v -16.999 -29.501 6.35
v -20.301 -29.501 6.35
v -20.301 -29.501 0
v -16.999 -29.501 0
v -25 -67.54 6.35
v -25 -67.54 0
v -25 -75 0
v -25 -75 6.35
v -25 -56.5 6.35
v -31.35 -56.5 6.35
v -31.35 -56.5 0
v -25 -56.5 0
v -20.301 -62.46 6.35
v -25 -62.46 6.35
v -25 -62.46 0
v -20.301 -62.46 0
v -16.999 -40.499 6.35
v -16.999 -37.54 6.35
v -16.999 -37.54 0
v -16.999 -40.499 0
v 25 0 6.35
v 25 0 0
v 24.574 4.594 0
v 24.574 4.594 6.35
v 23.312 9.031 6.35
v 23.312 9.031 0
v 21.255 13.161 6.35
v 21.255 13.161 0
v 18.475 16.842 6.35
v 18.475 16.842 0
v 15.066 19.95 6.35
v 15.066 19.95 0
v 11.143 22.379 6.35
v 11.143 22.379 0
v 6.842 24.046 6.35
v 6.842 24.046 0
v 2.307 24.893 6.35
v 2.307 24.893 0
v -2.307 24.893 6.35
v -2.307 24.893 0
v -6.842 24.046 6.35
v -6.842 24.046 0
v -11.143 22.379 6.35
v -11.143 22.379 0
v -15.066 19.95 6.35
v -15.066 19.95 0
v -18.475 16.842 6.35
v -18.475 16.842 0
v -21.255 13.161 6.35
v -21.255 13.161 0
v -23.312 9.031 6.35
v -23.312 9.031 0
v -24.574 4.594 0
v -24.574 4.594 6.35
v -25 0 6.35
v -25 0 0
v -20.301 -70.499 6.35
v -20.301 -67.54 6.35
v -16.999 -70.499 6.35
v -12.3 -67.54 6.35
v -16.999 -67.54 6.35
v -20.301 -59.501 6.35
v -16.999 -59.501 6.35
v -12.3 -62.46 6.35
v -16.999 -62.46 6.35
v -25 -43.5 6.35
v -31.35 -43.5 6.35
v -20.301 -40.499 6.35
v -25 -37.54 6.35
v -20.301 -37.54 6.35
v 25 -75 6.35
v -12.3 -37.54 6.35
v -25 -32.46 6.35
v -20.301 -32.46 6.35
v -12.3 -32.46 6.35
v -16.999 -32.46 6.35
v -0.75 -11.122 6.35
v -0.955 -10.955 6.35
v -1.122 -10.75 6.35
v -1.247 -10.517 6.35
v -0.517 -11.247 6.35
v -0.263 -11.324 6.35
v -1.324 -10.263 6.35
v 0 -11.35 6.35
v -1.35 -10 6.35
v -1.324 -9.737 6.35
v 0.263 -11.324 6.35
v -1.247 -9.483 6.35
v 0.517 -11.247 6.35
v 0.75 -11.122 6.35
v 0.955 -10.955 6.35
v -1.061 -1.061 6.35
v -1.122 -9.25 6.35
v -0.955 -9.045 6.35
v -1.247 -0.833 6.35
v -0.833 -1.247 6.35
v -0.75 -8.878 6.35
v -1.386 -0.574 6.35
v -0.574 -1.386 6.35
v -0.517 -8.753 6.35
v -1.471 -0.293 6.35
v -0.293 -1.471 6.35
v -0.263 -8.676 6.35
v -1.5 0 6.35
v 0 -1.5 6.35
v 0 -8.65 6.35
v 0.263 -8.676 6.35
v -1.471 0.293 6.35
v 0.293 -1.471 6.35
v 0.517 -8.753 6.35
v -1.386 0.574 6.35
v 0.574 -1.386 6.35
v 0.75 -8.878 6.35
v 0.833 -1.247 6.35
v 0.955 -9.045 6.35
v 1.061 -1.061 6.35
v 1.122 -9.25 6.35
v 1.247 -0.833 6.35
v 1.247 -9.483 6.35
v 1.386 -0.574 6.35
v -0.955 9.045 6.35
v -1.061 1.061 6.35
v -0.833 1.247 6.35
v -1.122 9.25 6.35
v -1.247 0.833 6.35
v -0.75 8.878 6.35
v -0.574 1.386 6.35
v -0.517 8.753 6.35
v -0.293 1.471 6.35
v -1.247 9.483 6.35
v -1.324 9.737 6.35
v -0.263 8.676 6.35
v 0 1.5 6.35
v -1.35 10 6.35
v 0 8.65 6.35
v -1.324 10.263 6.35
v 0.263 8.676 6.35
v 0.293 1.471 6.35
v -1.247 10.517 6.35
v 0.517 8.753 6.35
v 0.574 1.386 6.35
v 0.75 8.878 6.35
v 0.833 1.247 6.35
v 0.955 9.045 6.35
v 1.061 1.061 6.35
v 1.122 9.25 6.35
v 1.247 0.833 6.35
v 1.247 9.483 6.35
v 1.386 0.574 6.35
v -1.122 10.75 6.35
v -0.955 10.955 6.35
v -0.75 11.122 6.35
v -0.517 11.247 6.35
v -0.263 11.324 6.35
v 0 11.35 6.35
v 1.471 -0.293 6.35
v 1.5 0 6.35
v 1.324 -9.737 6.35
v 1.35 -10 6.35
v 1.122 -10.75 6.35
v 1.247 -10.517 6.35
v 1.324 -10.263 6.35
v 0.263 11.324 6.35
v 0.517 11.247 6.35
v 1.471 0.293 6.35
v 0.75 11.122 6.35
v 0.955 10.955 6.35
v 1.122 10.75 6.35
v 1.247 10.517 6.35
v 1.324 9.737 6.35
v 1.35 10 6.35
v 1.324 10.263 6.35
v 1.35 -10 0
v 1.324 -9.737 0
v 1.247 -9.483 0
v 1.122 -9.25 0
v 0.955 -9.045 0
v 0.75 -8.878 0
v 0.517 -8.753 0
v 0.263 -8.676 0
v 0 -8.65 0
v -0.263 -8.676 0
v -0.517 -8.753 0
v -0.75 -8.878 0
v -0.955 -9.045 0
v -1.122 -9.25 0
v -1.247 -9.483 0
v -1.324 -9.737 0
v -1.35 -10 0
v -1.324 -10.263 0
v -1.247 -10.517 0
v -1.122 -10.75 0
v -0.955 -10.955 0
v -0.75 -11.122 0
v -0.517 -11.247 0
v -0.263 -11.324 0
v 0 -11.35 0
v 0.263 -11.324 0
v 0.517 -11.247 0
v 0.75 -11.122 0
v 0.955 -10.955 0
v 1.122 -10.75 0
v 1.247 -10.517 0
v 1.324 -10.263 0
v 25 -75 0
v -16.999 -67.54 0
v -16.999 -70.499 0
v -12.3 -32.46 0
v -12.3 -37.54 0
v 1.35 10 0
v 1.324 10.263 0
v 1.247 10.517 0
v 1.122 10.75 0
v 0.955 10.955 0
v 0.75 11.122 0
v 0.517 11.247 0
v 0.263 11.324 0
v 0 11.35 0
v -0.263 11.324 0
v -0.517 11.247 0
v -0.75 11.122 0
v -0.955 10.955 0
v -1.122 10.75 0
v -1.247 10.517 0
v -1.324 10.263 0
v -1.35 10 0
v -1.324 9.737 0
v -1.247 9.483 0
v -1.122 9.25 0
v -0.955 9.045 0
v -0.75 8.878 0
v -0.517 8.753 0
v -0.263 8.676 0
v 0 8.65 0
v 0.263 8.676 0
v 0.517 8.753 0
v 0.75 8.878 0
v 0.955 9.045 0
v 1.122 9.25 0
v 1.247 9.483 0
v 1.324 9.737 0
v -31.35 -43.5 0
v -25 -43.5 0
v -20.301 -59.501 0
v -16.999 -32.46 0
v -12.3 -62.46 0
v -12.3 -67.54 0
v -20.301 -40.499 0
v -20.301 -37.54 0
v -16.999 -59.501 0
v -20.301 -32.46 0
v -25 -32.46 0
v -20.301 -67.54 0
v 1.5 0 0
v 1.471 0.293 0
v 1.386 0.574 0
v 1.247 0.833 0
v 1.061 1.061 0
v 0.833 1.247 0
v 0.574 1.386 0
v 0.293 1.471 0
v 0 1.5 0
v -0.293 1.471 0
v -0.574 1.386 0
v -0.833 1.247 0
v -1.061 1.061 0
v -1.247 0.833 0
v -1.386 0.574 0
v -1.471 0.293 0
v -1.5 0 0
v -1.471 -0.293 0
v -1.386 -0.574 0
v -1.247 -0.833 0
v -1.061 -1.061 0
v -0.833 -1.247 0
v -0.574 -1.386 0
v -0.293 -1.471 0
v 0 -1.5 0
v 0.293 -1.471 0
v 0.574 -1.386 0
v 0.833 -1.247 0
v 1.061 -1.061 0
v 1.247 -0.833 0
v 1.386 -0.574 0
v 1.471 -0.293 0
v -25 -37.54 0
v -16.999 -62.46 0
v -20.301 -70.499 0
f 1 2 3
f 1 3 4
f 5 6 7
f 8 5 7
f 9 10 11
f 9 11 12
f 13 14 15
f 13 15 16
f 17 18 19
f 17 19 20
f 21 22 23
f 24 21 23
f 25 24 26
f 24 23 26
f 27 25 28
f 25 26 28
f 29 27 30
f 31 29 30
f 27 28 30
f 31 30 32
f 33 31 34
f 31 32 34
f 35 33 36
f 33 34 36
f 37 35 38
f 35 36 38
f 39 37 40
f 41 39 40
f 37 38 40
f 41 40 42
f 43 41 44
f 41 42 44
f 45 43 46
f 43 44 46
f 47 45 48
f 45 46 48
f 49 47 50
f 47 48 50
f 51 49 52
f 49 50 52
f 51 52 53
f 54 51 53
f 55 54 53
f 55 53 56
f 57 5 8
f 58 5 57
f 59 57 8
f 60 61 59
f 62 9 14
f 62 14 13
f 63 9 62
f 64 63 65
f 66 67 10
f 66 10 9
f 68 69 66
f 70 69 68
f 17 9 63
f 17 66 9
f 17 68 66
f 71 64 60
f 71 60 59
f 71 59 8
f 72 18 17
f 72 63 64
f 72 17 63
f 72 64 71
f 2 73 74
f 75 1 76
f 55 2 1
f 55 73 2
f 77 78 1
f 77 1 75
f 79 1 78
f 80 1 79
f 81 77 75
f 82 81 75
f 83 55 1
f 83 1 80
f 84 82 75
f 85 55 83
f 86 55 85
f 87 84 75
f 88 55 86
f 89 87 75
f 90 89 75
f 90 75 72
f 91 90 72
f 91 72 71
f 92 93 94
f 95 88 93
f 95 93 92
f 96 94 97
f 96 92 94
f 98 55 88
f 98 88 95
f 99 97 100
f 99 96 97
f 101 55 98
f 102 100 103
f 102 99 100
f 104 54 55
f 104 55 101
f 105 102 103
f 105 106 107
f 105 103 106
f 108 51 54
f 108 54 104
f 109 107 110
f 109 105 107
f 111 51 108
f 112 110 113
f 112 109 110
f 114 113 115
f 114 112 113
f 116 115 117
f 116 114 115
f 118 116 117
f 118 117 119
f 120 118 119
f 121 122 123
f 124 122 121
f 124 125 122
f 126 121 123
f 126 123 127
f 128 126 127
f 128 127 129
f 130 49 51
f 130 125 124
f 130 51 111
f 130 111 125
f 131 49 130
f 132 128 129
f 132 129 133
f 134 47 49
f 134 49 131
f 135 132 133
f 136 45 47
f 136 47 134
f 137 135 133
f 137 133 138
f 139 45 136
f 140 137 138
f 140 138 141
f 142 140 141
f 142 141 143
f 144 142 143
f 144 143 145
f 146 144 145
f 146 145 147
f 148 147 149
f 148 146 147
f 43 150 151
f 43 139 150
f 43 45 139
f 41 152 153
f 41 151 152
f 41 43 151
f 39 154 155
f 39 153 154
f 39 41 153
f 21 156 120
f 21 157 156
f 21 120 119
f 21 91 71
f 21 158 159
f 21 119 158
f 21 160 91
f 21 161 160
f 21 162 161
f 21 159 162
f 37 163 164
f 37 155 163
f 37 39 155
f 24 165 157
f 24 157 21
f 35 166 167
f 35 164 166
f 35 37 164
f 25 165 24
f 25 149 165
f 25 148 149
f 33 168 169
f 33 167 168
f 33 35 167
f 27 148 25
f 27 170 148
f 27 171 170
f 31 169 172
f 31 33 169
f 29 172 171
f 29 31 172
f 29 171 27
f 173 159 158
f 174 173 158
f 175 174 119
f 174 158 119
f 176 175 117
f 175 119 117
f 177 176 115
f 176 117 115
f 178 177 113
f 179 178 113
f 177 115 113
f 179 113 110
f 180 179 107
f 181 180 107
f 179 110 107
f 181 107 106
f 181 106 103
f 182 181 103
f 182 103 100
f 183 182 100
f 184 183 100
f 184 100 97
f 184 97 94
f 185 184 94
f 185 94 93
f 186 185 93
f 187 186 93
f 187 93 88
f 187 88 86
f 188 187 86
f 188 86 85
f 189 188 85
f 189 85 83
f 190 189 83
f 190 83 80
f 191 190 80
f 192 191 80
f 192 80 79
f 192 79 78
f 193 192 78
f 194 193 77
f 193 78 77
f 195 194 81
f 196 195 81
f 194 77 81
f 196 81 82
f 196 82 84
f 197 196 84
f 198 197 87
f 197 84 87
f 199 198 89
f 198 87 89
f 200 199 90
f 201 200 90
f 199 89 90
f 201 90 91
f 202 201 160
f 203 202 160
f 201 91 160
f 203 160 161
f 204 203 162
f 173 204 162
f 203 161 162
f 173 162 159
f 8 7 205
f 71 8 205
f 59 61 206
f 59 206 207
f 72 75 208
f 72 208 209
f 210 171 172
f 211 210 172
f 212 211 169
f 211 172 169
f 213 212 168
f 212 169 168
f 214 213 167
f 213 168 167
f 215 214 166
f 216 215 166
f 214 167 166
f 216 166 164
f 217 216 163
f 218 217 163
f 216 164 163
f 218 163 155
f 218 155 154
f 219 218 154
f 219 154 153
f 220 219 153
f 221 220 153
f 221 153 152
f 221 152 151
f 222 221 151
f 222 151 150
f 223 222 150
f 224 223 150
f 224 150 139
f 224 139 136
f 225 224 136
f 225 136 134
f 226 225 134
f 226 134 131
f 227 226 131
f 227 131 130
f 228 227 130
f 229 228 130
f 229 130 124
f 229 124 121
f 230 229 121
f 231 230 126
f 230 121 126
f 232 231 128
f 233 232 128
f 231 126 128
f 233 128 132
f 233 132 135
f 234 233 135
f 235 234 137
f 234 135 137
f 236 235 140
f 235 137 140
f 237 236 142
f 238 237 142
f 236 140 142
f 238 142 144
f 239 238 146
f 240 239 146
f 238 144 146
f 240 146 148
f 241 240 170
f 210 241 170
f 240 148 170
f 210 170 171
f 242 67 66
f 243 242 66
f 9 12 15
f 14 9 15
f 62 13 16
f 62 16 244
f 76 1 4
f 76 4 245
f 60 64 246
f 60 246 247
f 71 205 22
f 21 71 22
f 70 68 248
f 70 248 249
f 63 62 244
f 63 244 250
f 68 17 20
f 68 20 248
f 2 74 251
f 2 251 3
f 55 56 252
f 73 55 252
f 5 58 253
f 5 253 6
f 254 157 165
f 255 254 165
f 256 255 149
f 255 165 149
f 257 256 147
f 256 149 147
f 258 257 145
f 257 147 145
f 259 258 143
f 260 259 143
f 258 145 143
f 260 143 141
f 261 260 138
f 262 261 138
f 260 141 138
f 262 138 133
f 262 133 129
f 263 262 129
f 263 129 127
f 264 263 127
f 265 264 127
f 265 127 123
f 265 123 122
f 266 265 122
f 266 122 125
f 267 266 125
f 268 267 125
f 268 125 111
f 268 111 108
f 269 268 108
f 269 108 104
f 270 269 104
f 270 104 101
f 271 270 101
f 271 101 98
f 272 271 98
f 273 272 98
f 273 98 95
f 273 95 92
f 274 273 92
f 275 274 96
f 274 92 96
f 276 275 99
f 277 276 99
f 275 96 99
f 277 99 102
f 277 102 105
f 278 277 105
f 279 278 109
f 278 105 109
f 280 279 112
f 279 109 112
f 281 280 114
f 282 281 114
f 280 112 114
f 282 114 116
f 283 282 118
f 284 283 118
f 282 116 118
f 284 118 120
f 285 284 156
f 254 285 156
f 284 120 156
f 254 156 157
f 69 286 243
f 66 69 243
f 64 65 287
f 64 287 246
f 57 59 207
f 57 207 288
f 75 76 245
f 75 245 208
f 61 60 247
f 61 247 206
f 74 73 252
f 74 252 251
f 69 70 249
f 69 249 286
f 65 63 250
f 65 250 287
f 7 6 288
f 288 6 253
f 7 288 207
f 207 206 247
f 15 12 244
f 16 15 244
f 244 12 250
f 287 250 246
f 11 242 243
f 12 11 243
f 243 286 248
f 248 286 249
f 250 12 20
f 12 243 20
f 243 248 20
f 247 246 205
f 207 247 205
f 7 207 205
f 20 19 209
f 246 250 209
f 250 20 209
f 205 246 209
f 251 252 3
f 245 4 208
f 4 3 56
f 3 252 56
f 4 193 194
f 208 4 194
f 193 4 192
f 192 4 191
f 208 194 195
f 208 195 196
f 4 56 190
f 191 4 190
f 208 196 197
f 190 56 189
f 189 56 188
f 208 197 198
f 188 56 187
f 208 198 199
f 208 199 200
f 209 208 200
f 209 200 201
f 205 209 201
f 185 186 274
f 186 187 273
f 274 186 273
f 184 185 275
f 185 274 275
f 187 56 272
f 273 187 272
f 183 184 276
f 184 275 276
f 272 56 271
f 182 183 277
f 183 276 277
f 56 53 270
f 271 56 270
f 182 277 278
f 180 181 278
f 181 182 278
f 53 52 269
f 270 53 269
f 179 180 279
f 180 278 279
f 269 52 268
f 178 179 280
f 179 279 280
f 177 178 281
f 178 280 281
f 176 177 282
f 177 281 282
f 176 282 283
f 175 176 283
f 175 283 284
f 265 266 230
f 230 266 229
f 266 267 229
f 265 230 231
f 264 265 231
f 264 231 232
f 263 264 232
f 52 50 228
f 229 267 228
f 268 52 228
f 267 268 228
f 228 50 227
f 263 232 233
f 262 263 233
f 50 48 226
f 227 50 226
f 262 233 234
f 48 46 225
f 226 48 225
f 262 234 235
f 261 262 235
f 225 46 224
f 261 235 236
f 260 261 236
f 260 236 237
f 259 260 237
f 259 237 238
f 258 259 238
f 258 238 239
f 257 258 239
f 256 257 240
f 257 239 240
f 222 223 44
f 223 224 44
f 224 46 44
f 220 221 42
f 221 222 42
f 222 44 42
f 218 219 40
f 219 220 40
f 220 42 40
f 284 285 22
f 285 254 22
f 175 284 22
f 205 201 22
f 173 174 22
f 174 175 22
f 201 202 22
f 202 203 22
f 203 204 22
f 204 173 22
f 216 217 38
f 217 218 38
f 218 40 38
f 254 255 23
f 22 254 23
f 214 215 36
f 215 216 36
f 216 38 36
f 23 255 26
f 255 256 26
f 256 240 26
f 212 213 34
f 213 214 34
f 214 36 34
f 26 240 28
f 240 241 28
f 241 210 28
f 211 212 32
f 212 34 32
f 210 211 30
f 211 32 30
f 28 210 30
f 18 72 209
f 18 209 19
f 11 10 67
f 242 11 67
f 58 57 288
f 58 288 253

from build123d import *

# Parameters (mm, degrees)
BOSS_EXTRUDE1_DEPTH = 6.35
SKETCH2_R           = 1.5
SKETCH2_R_2         = 1.35
CUT_EXTRUDE1_DEPTH  = 80.311553383
CUT_EXTRUDE3_DEPTH  = 80.311553383
SKETCH7_W           = 6.35
SKETCH7_H           = 13
BOSS_EXTRUDE3_DEPTH = 6.35


with BuildPart() as part:
    # Sketch1 → Boss-Extrude1 (new body)
    with BuildSketch(Plane.XY):
        with BuildLine():
            Line((-25, 0), (-25, -75))
            Line((-25, -75), (25, -75))
            Line((25, -75), (25, 0))
            ThreePointArc((25, 0), (0, 25), (-25, 0))
        make_face()
    extrude(amount=BOSS_EXTRUDE1_DEPTH)

    # Sketch2 → Cut-Extrude1 (cut, through all)
    with BuildSketch(Plane.XY.offset(6.35)):
        Circle(SKETCH2_R)
        with Locations((0, 10)):
            Circle(SKETCH2_R_2)
        with Locations((0, -10)):
            Circle(SKETCH2_R_2)
    extrude(amount=-CUT_EXTRUDE1_DEPTH, mode=Mode.SUBTRACT)

    # Sketch6 → Cut-Extrude3 (cut, through all)
    with BuildSketch(Plane.XY.offset(6.35)):
        Polygon((-12.3, -67.54), (-16.999, -67.54), (-16.999, -70.4991), (-20.301, -70.4991), (-20.301, -67.54), (-25, -67.54), (-25, -62.46), (-20.301, -62.46), (-20.301, -59.5009), (-16.999, -59.5009), (-16.999, -62.46), (-12.3, -62.46), align=None)
        Polygon((-12.3, -37.54), (-16.999, -37.54), (-16.999, -40.4991), (-20.301, -40.4991), (-20.301, -37.54), (-25, -37.54), (-25, -32.46), (-20.301, -32.46), (-20.301, -29.5009), (-16.999, -29.5009), (-16.999, -32.46), (-12.3, -32.46), align=None)
    extrude(amount=-CUT_EXTRUDE3_DEPTH, mode=Mode.SUBTRACT)

    # Sketch7 → Boss-Extrude3 (add)
    with BuildSketch(Plane.XY.offset(6.35)):
        with Locations((-28.175, -50)):
            Rectangle(SKETCH7_W, SKETCH7_H)
    extrude(amount=-BOSS_EXTRUDE3_DEPTH)


solid = part.part
